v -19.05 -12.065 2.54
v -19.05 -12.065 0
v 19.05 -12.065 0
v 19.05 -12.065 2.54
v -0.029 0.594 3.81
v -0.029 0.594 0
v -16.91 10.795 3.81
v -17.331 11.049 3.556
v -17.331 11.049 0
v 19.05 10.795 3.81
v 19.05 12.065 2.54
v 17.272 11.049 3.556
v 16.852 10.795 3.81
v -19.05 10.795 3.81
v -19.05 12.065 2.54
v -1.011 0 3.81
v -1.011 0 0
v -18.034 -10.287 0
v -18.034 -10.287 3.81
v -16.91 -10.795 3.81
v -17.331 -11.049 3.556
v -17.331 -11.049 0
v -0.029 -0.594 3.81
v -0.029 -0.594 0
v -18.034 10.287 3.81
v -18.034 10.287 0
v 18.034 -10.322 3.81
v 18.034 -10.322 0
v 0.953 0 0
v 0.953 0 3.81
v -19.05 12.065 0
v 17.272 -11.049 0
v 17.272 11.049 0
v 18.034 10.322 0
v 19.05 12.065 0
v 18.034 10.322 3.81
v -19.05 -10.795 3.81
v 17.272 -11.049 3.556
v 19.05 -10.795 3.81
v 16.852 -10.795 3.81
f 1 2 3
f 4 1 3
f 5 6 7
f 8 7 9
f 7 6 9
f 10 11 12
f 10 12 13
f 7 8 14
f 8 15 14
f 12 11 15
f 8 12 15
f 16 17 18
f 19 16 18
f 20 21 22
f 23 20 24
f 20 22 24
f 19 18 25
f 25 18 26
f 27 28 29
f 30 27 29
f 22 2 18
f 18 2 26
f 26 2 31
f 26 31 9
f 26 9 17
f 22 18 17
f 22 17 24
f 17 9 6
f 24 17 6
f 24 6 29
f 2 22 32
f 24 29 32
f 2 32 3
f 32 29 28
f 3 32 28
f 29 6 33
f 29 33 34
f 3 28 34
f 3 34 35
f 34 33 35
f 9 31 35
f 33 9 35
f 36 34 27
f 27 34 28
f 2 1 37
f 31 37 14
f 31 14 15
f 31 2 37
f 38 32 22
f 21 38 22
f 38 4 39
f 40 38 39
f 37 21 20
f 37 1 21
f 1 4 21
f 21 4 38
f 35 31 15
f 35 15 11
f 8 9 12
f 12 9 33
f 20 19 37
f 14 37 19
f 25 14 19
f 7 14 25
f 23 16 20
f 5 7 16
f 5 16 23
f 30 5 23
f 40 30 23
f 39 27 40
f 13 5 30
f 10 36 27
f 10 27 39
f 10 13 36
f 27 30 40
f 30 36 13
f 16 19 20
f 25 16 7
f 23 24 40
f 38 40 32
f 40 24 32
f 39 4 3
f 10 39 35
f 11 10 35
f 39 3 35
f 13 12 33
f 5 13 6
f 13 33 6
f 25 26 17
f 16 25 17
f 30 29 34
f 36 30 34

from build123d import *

# Parameters (mm, degrees)
F0_W        = 38.1
F0_H        = 24.13
F1_DEPTH    = 3.81
F2_T1_DEPTH = 44.6320747894


# Not quite as in the source:
# - a fillet or chamfer that OpenCascade refuses, or shapes differently, is made with other operations: its cross-section is extruded or revolved along the edge and cut away or added


with BuildPart() as f1:
    # F0 (on Top) → F1 (new body)
    with BuildSketch(Plane.XY):
        Rectangle(F0_W, F0_H)
        Polygon((-0.029270627, -0.5935558801), (17.272, -11.049), (-17.330541254, -11.049), align=None, mode=Mode.SUBTRACT)
        Polygon((-18.034, -10.287), (-18.034, 10.287), (-1.0114642857, 0), align=None, mode=Mode.SUBTRACT)
        Polygon((-17.330541254, 11.049), (17.272, 11.049), (-0.029270627, 0.5935558801), align=None, mode=Mode.SUBTRACT)
        Polygon((0.9529230317, 0), (18.034, 10.3223774485), (18.034, -10.3223774485), align=None, mode=Mode.SUBTRACT)
    extrude(amount=F1_DEPTH)

    # F2: chamfer of 1.27 on 2 edges, made by hand

    # F2_s2 → F2_t1 (cut)
    with BuildSketch(Plane.YZ.offset(-22.3160373947)):
        Polygon((-12.065, 2.54), (-10.795, 3.81), (-12.065, 3.81), align=None)
        Polygon((12.065, 2.54), (10.795, 3.81), (12.065, 3.81), align=None)
    extrude(amount=F2_T1_DEPTH, mode=Mode.SUBTRACT)


solid = f1.part
